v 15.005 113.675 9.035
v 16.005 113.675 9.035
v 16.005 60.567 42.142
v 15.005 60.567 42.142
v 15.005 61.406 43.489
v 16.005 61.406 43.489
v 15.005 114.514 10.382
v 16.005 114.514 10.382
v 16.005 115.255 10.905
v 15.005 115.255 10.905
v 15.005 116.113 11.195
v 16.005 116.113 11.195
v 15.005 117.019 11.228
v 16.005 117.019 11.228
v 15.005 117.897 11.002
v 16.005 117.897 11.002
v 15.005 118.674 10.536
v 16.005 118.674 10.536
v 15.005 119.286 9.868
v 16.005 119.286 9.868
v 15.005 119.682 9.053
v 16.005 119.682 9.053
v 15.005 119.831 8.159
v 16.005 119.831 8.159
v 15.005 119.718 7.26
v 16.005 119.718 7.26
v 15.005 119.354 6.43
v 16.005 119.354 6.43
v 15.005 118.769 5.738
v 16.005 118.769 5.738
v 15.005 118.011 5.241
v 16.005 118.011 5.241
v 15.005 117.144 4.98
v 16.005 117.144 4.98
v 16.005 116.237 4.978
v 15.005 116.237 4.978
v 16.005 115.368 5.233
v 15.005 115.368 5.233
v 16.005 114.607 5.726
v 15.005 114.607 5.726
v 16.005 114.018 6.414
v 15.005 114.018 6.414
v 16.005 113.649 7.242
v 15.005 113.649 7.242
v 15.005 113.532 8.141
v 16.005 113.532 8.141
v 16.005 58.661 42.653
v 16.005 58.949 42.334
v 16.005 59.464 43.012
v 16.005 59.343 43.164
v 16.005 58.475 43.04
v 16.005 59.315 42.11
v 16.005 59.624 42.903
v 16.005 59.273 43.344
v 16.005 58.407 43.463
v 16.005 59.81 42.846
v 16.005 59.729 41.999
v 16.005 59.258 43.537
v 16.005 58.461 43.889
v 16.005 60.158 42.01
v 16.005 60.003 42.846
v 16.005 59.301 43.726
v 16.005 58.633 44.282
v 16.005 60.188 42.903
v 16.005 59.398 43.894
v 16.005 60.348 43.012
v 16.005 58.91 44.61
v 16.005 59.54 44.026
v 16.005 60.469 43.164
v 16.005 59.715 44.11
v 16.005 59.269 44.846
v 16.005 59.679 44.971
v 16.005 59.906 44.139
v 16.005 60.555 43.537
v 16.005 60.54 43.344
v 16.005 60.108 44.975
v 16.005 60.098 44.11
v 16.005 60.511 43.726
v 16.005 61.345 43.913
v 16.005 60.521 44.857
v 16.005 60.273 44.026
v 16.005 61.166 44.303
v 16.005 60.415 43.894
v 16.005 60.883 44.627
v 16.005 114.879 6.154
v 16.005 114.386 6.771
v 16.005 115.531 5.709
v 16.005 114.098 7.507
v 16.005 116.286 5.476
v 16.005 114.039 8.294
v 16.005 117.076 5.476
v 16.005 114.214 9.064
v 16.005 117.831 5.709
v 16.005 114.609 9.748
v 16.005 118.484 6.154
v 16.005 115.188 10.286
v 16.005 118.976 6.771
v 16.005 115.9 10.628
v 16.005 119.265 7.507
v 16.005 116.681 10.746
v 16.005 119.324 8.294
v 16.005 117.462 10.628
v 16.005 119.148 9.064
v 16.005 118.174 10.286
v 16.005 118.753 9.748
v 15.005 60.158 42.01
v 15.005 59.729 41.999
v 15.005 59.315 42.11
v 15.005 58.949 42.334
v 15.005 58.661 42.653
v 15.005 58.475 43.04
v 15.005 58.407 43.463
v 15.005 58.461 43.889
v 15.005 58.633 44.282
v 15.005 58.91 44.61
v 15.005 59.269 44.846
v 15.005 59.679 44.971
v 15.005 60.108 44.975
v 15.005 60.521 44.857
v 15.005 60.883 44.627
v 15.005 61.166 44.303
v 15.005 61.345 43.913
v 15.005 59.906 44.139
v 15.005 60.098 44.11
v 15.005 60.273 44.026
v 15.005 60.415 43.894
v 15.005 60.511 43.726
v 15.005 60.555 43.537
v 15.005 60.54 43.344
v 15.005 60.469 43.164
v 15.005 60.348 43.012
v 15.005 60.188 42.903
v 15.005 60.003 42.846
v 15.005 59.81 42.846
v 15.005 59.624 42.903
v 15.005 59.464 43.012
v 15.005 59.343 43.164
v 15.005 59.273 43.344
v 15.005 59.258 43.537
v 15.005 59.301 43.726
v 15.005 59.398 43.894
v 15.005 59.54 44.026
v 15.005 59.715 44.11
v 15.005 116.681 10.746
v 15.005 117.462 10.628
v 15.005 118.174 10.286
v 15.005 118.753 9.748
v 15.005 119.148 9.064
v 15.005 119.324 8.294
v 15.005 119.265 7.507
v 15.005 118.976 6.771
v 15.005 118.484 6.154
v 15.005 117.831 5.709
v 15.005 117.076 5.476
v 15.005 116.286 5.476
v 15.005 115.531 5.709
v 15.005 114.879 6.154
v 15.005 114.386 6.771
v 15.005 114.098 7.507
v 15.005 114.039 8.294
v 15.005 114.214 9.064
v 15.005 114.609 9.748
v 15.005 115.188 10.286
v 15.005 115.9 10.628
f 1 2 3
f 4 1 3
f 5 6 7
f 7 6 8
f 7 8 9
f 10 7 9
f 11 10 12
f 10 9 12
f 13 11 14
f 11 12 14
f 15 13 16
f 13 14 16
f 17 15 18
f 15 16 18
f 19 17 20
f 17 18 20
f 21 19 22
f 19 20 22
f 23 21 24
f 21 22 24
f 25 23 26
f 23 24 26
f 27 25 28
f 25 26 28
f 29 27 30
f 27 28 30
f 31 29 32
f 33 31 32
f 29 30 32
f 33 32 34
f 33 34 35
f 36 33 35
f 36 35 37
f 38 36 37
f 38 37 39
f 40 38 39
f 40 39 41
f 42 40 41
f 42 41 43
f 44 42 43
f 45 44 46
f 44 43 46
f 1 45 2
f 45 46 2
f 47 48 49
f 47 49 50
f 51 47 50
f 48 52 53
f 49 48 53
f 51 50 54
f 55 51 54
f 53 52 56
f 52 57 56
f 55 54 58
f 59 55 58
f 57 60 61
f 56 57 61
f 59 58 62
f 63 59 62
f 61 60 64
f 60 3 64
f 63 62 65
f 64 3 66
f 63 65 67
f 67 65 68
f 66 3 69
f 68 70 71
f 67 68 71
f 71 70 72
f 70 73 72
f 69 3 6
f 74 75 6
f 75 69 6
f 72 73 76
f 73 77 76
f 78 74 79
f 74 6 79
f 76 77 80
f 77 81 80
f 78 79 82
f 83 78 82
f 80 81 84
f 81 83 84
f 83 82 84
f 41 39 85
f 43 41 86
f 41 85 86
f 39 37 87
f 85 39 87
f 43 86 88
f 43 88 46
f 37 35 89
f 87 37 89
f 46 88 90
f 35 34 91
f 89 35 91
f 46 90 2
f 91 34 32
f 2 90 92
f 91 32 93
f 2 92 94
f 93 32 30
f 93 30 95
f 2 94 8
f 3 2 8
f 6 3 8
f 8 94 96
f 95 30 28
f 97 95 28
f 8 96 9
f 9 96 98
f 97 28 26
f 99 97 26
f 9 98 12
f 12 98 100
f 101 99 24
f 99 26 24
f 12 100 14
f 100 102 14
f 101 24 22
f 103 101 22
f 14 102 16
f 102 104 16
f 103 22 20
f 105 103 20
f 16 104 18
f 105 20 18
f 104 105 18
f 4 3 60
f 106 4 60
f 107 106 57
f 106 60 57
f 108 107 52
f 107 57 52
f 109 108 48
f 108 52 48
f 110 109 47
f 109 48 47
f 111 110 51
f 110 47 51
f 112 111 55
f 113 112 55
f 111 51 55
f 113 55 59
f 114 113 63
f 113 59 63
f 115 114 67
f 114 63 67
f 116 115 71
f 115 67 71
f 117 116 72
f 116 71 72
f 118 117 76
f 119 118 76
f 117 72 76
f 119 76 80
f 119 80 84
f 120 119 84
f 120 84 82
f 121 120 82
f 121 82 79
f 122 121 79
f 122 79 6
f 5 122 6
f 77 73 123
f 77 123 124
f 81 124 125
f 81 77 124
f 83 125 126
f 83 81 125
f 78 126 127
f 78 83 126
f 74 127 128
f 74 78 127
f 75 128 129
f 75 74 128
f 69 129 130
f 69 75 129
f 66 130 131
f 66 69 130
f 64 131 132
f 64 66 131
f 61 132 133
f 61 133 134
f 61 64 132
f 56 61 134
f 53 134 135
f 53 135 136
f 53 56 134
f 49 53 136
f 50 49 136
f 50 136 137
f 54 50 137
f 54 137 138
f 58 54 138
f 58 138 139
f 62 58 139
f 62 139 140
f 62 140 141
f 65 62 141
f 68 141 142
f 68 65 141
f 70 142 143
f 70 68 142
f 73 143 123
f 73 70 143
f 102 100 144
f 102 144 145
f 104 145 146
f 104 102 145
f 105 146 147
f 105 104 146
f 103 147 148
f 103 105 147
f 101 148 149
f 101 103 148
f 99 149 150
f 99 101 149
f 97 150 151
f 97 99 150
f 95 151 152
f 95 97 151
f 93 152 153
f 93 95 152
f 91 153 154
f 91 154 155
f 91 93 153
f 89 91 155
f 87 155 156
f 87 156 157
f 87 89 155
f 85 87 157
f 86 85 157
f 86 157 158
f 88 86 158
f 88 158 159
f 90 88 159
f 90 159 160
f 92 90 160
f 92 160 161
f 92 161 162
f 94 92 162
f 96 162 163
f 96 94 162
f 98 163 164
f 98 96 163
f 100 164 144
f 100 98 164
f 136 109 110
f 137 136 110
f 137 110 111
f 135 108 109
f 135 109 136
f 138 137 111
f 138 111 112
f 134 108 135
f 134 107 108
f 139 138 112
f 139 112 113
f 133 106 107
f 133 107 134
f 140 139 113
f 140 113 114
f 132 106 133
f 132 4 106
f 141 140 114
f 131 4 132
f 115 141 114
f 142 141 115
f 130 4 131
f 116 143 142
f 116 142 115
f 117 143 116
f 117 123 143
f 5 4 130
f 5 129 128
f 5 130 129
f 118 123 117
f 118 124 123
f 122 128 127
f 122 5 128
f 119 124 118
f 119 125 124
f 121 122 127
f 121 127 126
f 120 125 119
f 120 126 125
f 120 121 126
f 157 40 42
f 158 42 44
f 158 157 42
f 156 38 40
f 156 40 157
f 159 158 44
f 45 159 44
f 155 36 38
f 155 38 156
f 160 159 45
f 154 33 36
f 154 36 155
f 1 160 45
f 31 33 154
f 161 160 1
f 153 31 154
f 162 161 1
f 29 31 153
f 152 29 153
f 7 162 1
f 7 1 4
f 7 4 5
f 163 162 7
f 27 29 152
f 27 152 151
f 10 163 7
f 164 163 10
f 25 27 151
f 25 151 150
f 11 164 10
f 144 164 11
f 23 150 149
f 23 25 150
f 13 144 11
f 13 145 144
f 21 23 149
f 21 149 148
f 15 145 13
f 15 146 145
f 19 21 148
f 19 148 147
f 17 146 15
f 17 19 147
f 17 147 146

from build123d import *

# Parameters (mm, degrees)
SKETCH1_R           = 2.65
SKETCH1_R_2         = 0.65
BOSS_EXTRUDE1_DEPTH = 1


with BuildPart() as part:
    # Sketch1 → Boss-Extrude1 (new body)
    with BuildSketch(Plane.ZY.offset(-16.004809472)):
        with BuildLine():
            Line((43.488619522, 61.406385053), (10.382219934, 114.514122983))
            ThreePointArc((10.382219934, 114.514122983), (6.429799658, 119.354410747), (9.035439795, 113.674564697))
            Line((9.035439795, 113.674564697), (42.141839383, 60.566826767))
            ThreePointArc((42.141839383, 60.566826767), (44.282136198, 58.633462713), (43.488619522, 61.406385053))
        make_face()
        with Locations((8.096184677, 116.681273832)):
            Circle(SKETCH1_R, mode=Mode.SUBTRACT)
        with Locations((43.488619522, 59.906385053)):
            Circle(SKETCH1_R_2, mode=Mode.SUBTRACT)
    extrude(amount=BOSS_EXTRUDE1_DEPTH)


solid = part.part
